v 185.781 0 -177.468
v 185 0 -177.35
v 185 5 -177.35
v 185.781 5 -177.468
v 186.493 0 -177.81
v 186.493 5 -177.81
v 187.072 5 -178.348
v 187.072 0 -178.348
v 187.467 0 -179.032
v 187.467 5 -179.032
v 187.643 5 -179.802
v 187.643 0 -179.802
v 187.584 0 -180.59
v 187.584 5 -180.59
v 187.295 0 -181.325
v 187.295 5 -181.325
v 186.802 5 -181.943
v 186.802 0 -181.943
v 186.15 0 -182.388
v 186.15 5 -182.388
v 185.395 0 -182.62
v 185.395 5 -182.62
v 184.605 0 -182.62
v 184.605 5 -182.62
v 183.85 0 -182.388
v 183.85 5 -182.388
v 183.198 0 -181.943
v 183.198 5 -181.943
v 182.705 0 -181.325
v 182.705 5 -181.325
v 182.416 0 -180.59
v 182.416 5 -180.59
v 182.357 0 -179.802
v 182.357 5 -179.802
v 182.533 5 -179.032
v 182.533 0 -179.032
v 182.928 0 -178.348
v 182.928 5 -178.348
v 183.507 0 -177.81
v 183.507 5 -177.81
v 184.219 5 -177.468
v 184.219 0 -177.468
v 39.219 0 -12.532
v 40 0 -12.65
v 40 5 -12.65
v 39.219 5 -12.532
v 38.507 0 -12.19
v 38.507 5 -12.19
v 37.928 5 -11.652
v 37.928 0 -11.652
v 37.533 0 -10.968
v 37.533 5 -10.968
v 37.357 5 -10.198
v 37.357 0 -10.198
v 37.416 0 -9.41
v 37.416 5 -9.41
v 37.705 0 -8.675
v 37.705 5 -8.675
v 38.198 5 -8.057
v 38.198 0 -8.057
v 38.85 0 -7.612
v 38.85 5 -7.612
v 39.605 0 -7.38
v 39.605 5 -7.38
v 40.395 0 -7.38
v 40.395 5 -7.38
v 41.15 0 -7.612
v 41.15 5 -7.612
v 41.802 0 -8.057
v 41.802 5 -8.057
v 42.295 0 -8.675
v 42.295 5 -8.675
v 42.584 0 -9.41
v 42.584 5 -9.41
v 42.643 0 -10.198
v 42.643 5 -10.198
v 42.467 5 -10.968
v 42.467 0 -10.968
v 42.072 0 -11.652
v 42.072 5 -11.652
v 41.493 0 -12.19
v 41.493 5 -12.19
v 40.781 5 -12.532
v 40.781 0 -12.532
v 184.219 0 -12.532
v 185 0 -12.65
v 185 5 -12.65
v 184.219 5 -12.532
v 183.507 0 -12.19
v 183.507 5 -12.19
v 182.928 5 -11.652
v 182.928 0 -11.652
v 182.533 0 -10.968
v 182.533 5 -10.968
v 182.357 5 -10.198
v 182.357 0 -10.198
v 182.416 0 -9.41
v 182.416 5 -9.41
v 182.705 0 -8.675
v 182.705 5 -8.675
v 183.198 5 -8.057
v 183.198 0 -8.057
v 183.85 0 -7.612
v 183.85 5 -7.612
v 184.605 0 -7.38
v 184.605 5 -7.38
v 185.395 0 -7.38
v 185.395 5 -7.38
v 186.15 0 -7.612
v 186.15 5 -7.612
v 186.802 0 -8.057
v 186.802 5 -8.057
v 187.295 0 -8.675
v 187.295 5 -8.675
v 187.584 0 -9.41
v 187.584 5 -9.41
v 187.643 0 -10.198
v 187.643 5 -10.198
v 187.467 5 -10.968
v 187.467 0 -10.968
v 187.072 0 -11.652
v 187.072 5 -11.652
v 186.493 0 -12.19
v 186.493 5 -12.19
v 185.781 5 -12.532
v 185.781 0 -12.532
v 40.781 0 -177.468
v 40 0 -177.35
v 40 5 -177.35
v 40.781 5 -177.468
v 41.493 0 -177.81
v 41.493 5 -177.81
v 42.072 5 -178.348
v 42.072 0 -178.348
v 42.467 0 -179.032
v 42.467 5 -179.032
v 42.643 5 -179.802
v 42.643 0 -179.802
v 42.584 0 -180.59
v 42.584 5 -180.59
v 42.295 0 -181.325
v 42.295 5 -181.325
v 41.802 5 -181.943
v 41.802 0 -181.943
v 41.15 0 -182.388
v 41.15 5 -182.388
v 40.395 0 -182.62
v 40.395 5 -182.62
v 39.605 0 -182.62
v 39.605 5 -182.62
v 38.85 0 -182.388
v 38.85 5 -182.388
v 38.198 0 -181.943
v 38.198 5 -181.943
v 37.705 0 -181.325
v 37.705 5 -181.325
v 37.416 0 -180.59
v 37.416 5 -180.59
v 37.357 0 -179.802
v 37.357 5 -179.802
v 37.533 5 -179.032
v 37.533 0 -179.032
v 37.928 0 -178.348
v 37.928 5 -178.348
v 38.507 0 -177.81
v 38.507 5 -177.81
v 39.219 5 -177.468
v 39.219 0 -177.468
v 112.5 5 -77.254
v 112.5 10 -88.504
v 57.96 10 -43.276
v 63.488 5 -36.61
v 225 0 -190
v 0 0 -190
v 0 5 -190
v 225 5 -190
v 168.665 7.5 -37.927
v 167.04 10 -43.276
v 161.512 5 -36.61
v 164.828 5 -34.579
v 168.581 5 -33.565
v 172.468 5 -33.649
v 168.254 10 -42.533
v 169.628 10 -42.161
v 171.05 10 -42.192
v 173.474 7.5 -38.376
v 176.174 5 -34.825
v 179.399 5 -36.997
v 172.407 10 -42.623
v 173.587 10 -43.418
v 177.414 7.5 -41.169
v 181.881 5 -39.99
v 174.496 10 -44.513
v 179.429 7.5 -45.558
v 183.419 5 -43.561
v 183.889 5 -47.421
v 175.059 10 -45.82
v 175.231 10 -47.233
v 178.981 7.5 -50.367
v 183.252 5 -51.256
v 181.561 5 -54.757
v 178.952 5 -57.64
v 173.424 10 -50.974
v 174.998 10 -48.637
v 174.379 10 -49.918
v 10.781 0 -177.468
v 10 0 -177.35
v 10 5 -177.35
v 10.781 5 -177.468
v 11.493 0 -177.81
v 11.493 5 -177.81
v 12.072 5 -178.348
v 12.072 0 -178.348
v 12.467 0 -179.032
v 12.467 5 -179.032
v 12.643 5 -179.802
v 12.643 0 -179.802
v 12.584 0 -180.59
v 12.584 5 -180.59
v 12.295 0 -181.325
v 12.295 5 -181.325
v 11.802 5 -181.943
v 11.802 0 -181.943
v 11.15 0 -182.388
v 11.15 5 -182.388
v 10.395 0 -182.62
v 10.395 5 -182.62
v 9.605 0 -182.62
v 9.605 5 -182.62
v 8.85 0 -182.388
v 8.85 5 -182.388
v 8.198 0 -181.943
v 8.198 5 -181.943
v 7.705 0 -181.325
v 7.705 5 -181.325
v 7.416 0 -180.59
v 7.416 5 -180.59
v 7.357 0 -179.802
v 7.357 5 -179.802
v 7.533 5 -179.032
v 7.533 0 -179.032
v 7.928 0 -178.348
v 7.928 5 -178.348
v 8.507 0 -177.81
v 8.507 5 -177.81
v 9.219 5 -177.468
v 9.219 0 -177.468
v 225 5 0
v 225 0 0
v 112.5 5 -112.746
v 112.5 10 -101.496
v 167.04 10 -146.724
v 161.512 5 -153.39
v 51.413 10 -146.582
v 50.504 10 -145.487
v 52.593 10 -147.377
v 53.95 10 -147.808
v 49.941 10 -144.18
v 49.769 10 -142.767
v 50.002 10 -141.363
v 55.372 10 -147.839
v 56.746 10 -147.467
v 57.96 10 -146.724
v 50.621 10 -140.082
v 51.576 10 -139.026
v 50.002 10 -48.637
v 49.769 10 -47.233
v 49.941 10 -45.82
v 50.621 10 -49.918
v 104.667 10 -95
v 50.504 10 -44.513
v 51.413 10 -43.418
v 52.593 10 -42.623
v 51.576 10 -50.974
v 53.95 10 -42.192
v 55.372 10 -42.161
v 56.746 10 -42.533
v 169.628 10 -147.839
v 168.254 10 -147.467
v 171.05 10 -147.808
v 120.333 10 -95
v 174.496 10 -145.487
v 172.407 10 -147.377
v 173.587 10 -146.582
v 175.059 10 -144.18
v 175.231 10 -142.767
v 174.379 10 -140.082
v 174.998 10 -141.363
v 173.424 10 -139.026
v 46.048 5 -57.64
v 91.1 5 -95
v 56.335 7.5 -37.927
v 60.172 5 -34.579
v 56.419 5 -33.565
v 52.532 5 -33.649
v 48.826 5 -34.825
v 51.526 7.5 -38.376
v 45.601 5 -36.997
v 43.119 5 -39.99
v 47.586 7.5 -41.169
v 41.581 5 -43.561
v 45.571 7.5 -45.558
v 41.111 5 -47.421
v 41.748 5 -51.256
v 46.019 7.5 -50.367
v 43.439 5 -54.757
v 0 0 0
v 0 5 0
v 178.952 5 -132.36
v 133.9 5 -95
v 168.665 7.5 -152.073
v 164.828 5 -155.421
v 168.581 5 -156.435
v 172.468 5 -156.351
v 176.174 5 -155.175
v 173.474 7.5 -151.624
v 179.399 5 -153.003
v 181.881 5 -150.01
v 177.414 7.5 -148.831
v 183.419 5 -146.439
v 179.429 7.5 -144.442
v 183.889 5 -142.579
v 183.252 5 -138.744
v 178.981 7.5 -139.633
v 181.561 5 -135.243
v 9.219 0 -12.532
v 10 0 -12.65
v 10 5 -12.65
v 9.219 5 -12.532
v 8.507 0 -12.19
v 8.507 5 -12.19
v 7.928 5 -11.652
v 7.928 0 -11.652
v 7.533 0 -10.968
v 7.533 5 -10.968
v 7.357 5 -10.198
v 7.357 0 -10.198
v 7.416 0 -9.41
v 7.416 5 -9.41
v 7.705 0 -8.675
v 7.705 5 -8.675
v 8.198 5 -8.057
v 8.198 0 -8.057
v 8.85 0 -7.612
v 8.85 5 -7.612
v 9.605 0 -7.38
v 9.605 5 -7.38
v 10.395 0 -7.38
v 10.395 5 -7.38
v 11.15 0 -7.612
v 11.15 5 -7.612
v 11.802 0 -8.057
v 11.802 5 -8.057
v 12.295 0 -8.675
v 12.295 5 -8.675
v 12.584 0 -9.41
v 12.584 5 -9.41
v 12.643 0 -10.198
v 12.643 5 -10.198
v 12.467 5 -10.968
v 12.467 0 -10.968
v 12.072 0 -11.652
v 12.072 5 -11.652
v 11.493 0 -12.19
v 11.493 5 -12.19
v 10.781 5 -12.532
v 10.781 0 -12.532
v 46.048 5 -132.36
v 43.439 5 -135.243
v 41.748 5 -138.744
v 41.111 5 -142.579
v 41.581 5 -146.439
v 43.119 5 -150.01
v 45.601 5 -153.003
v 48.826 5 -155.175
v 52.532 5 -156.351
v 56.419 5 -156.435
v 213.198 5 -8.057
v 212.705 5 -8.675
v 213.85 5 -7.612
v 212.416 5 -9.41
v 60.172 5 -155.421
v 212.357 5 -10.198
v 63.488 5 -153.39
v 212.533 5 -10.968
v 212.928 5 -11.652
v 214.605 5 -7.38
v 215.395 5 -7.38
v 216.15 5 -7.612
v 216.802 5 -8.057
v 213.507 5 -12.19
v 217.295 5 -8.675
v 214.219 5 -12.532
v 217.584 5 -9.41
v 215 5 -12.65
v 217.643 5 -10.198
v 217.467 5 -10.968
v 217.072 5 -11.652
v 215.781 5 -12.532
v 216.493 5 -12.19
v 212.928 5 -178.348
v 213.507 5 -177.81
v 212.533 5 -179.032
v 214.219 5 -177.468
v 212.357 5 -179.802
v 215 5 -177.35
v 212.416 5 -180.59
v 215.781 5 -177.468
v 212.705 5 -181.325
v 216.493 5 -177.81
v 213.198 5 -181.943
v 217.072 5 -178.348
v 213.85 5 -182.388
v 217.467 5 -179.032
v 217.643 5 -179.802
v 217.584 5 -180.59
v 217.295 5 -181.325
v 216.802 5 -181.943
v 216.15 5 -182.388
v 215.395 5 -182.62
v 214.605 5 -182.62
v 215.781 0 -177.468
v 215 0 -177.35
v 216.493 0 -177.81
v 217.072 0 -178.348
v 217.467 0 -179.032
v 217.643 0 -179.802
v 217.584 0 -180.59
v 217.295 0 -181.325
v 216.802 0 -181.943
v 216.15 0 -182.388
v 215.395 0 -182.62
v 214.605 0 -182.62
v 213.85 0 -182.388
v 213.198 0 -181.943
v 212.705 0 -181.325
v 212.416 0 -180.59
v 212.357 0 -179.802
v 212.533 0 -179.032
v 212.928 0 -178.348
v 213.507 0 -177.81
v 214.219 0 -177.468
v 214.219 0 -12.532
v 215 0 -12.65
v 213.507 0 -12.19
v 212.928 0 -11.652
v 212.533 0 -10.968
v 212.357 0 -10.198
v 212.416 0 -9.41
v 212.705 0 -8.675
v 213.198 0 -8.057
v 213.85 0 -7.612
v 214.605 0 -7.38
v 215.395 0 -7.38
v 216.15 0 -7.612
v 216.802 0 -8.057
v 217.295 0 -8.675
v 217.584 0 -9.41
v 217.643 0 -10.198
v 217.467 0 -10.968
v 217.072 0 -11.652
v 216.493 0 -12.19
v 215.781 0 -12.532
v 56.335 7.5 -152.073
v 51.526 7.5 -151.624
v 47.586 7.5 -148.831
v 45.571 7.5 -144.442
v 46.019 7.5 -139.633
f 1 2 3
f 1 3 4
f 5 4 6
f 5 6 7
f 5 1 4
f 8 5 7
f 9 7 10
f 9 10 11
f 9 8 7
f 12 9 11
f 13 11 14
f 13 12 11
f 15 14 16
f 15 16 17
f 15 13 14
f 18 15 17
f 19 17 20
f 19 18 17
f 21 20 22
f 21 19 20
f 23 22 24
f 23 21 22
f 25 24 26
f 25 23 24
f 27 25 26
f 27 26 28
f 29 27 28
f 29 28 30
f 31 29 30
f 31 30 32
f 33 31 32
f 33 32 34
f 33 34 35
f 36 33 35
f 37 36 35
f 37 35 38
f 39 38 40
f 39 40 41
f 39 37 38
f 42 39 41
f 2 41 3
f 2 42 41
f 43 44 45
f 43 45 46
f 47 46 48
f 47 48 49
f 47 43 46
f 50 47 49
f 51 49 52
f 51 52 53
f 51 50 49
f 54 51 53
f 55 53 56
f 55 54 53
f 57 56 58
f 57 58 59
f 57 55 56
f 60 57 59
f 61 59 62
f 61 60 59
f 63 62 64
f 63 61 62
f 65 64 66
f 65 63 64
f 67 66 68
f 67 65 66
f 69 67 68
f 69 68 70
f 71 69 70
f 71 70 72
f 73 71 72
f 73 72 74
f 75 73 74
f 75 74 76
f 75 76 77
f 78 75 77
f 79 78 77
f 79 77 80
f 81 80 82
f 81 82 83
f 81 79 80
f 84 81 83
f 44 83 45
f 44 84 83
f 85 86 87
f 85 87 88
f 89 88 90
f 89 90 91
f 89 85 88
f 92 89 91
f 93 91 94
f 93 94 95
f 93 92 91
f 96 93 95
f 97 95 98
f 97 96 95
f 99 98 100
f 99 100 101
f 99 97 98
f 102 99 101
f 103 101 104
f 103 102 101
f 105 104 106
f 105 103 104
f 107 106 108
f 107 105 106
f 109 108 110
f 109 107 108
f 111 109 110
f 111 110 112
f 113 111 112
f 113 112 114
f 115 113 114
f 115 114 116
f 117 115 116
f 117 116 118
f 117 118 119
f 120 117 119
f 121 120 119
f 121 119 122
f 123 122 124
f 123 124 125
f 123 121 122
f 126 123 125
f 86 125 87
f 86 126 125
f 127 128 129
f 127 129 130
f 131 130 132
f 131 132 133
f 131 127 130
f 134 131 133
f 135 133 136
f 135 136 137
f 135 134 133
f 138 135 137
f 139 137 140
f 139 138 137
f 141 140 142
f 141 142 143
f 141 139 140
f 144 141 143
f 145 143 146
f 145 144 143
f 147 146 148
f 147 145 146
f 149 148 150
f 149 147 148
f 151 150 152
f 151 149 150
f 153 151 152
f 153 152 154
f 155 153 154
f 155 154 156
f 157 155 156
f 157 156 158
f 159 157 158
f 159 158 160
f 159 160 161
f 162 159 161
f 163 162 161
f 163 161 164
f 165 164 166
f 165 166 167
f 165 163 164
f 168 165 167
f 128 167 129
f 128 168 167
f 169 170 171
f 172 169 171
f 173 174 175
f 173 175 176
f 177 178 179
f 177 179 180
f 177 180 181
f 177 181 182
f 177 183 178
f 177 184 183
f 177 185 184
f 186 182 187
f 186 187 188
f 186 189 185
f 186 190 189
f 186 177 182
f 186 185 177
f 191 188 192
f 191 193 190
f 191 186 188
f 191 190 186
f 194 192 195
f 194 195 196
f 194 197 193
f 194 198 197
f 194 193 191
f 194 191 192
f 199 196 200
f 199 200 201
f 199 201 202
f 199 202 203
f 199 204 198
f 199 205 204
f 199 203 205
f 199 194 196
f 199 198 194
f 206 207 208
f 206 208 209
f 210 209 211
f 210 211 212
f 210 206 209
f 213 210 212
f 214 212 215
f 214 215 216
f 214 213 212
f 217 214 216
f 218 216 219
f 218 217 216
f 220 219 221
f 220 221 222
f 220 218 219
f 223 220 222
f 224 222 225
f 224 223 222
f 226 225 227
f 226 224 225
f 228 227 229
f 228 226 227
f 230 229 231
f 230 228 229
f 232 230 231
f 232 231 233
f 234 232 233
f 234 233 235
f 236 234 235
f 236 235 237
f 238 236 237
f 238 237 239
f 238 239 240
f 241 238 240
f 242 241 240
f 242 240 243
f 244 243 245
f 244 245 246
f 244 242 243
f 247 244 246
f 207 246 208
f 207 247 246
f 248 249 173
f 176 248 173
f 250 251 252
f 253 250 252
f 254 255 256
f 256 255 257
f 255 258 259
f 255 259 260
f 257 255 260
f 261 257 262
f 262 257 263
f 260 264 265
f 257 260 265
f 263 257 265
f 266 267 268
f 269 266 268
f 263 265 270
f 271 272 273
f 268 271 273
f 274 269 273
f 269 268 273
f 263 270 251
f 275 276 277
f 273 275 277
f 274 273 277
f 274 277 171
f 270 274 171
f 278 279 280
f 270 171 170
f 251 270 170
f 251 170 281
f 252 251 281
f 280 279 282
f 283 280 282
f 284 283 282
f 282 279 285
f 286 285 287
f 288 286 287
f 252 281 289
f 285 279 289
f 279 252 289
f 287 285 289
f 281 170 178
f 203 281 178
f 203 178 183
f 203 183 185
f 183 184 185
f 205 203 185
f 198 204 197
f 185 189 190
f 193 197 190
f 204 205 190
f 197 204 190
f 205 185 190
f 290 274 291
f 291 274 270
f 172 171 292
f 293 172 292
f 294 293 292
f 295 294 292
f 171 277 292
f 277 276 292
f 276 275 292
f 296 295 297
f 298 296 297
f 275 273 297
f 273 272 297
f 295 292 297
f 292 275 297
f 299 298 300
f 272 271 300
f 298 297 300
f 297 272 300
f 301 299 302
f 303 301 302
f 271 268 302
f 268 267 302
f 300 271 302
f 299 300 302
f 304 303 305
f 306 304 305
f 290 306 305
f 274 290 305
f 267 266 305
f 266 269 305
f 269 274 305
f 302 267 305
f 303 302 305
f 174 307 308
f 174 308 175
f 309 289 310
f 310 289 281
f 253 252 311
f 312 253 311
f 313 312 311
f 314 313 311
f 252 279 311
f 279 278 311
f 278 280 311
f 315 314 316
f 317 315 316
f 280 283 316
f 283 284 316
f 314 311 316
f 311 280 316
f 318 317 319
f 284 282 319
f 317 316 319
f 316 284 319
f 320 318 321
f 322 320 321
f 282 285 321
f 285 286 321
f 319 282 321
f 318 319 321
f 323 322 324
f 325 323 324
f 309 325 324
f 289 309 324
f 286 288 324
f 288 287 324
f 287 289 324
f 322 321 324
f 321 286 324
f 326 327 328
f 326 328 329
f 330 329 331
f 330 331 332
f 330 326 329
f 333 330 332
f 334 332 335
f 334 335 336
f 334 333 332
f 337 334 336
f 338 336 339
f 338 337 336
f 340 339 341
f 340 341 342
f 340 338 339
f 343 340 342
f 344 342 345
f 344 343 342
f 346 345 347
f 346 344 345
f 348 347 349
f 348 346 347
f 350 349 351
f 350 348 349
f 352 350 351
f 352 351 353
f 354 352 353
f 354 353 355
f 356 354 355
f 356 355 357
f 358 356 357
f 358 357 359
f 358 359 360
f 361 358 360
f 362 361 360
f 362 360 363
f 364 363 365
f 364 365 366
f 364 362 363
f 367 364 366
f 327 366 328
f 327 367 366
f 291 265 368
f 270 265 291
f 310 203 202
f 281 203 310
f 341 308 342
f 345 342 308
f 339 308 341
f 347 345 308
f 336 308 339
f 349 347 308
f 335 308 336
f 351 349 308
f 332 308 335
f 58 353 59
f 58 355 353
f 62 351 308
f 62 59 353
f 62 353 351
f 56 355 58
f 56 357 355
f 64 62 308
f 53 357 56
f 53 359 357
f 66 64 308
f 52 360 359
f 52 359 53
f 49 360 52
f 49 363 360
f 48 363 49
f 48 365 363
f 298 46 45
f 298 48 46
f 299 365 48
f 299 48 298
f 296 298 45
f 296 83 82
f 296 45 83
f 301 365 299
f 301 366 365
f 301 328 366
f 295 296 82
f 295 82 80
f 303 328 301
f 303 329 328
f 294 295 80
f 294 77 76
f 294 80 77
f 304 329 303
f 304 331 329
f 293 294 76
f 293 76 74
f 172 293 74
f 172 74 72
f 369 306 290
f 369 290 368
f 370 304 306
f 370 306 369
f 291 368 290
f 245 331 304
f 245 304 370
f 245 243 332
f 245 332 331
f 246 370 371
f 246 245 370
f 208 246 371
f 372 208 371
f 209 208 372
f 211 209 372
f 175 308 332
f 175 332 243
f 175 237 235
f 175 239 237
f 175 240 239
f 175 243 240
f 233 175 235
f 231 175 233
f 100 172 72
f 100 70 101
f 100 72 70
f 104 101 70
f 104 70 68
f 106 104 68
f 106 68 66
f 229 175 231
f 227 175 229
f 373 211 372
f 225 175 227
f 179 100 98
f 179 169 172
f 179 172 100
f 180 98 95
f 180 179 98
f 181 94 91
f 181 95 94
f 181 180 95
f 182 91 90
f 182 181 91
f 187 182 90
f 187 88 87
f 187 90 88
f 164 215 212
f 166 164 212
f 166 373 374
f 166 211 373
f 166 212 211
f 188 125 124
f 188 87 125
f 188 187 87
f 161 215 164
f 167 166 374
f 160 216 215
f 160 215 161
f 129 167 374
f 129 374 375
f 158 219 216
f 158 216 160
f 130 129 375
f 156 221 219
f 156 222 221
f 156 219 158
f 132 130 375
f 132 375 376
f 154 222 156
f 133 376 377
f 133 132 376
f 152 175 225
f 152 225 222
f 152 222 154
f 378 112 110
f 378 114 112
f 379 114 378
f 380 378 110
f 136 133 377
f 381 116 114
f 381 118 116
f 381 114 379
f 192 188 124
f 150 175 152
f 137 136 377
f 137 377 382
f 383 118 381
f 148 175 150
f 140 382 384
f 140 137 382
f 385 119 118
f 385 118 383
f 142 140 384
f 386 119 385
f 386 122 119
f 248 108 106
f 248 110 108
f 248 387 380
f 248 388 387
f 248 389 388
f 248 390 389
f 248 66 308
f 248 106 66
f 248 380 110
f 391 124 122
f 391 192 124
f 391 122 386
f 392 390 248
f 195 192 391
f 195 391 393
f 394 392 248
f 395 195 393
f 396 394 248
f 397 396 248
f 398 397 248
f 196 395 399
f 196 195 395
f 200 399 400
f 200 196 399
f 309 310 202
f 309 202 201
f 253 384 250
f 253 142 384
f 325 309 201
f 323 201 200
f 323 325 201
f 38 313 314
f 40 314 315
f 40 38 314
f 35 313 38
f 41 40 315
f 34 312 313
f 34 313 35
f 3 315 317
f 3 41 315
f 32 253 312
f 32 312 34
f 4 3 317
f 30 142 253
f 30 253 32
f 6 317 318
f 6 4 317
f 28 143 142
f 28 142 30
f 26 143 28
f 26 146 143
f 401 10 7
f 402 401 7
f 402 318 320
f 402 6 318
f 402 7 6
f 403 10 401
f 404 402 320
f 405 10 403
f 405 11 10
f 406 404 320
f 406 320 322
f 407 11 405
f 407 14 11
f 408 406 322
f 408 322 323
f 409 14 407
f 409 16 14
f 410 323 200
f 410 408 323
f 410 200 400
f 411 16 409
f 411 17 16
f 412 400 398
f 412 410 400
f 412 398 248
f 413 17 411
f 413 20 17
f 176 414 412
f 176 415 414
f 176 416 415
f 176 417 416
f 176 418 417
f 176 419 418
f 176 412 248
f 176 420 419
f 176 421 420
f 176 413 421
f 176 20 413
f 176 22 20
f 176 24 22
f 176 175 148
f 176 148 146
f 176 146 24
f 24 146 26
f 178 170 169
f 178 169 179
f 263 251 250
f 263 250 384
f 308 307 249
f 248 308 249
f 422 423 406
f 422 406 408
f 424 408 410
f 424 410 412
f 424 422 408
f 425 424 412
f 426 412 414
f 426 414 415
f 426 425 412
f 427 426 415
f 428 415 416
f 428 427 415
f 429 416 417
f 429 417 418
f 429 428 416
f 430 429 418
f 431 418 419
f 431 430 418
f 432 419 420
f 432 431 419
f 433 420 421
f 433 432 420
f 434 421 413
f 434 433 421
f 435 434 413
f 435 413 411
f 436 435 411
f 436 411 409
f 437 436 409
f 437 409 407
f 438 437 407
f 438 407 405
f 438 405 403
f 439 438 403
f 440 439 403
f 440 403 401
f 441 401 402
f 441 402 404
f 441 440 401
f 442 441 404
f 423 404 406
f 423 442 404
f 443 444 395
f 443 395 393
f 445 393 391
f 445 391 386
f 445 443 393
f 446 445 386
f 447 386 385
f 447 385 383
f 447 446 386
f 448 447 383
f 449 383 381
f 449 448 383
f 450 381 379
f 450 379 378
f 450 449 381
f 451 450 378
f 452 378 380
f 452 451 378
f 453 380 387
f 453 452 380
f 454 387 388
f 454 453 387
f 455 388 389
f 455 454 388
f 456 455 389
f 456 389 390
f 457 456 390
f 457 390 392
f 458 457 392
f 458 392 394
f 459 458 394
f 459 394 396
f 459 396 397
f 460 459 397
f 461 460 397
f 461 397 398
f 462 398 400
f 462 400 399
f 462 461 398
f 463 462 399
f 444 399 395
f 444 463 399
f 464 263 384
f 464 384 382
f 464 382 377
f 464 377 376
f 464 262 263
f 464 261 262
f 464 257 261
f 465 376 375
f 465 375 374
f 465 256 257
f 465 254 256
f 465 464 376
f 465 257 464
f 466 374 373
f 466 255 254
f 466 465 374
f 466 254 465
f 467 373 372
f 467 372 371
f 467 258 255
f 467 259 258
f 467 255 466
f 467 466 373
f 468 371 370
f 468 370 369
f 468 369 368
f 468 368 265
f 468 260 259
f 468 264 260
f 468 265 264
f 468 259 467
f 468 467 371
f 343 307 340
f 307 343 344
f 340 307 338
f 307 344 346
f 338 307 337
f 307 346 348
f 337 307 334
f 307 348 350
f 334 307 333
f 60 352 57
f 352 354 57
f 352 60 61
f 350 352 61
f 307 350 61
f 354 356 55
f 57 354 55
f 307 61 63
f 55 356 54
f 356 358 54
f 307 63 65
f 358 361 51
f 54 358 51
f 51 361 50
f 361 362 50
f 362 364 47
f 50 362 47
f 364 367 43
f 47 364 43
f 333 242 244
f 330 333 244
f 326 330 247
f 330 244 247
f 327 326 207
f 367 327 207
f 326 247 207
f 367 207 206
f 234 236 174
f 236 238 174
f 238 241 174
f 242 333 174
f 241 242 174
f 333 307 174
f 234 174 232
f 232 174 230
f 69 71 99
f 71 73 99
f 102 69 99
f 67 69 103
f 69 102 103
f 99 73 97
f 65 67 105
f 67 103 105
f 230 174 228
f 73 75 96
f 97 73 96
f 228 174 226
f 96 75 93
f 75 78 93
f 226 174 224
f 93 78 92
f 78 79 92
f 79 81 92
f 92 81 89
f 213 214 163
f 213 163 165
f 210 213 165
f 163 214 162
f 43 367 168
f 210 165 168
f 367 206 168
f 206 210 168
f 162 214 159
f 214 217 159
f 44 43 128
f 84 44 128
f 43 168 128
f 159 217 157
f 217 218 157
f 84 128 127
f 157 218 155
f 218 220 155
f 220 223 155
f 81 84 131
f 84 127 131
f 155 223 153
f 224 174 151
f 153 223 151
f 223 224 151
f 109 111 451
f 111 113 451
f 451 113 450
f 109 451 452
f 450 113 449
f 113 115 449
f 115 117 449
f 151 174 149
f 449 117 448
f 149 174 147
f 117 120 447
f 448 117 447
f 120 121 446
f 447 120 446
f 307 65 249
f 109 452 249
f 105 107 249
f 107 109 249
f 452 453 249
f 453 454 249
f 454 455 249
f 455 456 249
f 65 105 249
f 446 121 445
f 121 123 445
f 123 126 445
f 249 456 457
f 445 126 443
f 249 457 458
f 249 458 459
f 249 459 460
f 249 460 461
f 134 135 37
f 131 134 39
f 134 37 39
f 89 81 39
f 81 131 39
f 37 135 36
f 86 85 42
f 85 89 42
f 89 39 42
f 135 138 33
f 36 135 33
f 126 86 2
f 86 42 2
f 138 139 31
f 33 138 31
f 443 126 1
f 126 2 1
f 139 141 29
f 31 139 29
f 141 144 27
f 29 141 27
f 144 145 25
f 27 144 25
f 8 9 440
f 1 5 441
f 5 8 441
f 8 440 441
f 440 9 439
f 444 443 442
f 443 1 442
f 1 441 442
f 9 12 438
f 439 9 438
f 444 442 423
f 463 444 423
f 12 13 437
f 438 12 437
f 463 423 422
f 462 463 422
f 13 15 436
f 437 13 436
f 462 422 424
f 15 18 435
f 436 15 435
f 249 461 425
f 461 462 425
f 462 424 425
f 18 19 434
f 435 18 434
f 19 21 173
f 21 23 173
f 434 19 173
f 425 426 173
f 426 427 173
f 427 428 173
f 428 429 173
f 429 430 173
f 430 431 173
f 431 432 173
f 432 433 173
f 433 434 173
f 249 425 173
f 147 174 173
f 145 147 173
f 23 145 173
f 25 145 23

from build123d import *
from OCP.BRepFilletAPI import BRepFilletAPI_MakeChamfer

# Parameters (mm, degrees)
SKETCH1_W           = 225
SKETCH1_H           = 190
SKETCH1_R           = 2.65
BOSS_EXTRUDE1_DEPTH = 5
BOSS_EXTRUDE2_DEPTH = 5
CHAMFER1_SIZE       = 8.660254038
CHAMFER1_SIZE_2     = 5


with BuildPart() as part:
    # Sketch1 → Boss-Extrude1 (new body)
    with BuildSketch(Plane(origin=(0, 0, 0), x_dir=(1, 0, 0), z_dir=(0, 1, 0))):
        with Locations((112.5, 95)):
            Rectangle(SKETCH1_W, SKETCH1_H)
        with Locations(Location((10, 180, 0), (0, 0, 270))):
            Circle(SKETCH1_R, mode=Mode.SUBTRACT)
        with Locations(Location((40, 180, 0), (0, 0, 270))):
            Circle(SKETCH1_R, mode=Mode.SUBTRACT)
        with Locations(Location((185, 180, 0), (0, 0, 270))):
            Circle(SKETCH1_R, mode=Mode.SUBTRACT)
        with Locations(Location((215, 180, 0), (0, 0, 270))):
            Circle(SKETCH1_R, mode=Mode.SUBTRACT)
        with Locations(Location((215, 10, 0), (0, 0, 90))):
            Circle(SKETCH1_R, mode=Mode.SUBTRACT)
        with Locations(Location((185, 10, 0), (0, 0, 90))):
            Circle(SKETCH1_R, mode=Mode.SUBTRACT)
        with Locations(Location((40, 10, 0), (0, 0, 90))):
            Circle(SKETCH1_R, mode=Mode.SUBTRACT)
        with Locations(Location((10, 10, 0), (0, 0, 90))):
            Circle(SKETCH1_R, mode=Mode.SUBTRACT)
    extrude(amount=BOSS_EXTRUDE1_DEPTH)

    # Sketch2 → Boss-Extrude2 (add)
    with BuildSketch(Plane(origin=(0, 5, 0), x_dir=(1, 0, 0), z_dir=(0, 1, 0))):
        with BuildLine():
            Line((51.576473623, 139.026400418), (167.040167682, 43.276019978))
            ThreePointArc((167.040167682, 43.276019978), (174.080636831, 43.933130432), (173.423526377, 50.973599582))
            Line((173.423526377, 50.973599582), (57.959832318, 146.723980022))
            ThreePointArc((57.959832318, 146.723980022), (50.919363169, 146.066869568), (51.576473623, 139.026400418))
        make_face()
    boss_extrude2 = extrude(amount=BOSS_EXTRUDE2_DEPTH)

    # Mirror1: Boss-Extrude2 across plane
    add(boss_extrude2.mirror(Plane(origin=(0, 0, -95), x_dir=(1, 0, 0), z_dir=(0, 0, -1))))

    # Chamfer1
    chamfer1_edges_1 = [part.edges().sort_by_distance(p)[0] for p in [
        (139.770083841, 5, -65.890235846),
    ]]
    chamfer1_side_1 = [part.faces().sort_by_distance(p)[0] for p in [
        (139.706250254, 5, -65.81326005),
    ]]
    chamfer1_edges_2 = [part.edges().sort_by_distance(p)[0] for p in [
        (174.080636831, 5, -43.933130432),
    ]]
    chamfer1_side_2 = [part.faces().sort_by_distance(p)[0] for p in [
        (174.157612628, 5, -43.869296845),
    ]]
    chamfer1_edges_3 = [part.edges().sort_by_distance(p)[0] for p in [
        (146.878196714, 5, -72.986799791),
    ]]
    chamfer1_side_3 = [part.faces().sort_by_distance(p)[0] for p in [
        (146.942030301, 5, -73.063775587),
    ]]
    chamfer1_edges_4 = [part.edges().sort_by_distance(p)[0] for p in [
        (146.878196714, 5, -117.013200209),
    ]]
    chamfer1_side_4 = [part.faces().sort_by_distance(p)[0] for p in [
        (146.942030301, 5, -116.936224413),
    ]]
    chamfer1_edges_5 = [part.edges().sort_by_distance(p)[0] for p in [
        (174.080636831, 5, -146.066869568),
    ]]
    chamfer1_side_5 = [part.faces().sort_by_distance(p)[0] for p in [
        (174.157612628, 5, -146.130703155),
    ]]
    chamfer1_edges_6 = [part.edges().sort_by_distance(p)[0] for p in [
        (139.770083841, 5, -124.109764154),
    ]]
    chamfer1_side_6 = [part.faces().sort_by_distance(p)[0] for p in [
        (139.706250254, 5, -124.18673995),
    ]]
    chamfer1_edges_7 = [part.edges().sort_by_distance(p)[0] for p in [
        (85.229916159, 5, -124.109764154),
    ]]
    chamfer1_side_7 = [part.faces().sort_by_distance(p)[0] for p in [
        (85.293749746, 5, -124.18673995),
    ]]
    chamfer1_edges_8 = [part.edges().sort_by_distance(p)[0] for p in [
        (85.229916159, 5, -65.890235846),
    ]]
    chamfer1_side_8 = [part.faces().sort_by_distance(p)[0] for p in [
        (85.293749746, 5, -65.81326005),
    ]]
    chamfer1_edges_9 = [part.edges().sort_by_distance(p)[0] for p in [
        (50.919363169, 5, -146.066869568),
    ]]
    chamfer1_side_9 = [part.faces().sort_by_distance(p)[0] for p in [
        (50.842387372, 5, -146.130703155),
    ]]
    chamfer1_edges_10 = [part.edges().sort_by_distance(p)[0] for p in [
        (50.919363169, 5, -43.933130432),
    ]]
    chamfer1_side_10 = [part.faces().sort_by_distance(p)[0] for p in [
        (50.842387372, 5, -43.869296845),
    ]]
    chamfer1_edges_11 = [part.edges().sort_by_distance(p)[0] for p in [
        (78.121803286, 5, -117.013200209),
    ]]
    chamfer1_side_11 = [part.faces().sort_by_distance(p)[0] for p in [
        (78.057969699, 5, -116.936224413),
    ]]
    chamfer1_edges_12 = [part.edges().sort_by_distance(p)[0] for p in [
        (78.121803286, 5, -72.986799791),
    ]]
    chamfer1_side_12 = [part.faces().sort_by_distance(p)[0] for p in [
        (78.057969699, 5, -73.063775587),
    ]]
    chamfer1 = BRepFilletAPI_MakeChamfer(part.part.solid().wrapped)
    for e in chamfer1_edges_1:
        chamfer1.Add(CHAMFER1_SIZE - 0.0001, CHAMFER1_SIZE_2 - 0.0001, e.wrapped, chamfer1_side_1[0].wrapped)
    for e in chamfer1_edges_2:
        chamfer1.Add(CHAMFER1_SIZE - 0.0001, CHAMFER1_SIZE_2 - 0.0001, e.wrapped, chamfer1_side_2[0].wrapped)
    for e in chamfer1_edges_3:
        chamfer1.Add(CHAMFER1_SIZE - 0.0001, CHAMFER1_SIZE_2 - 0.0001, e.wrapped, chamfer1_side_3[0].wrapped)
    for e in chamfer1_edges_4:
        chamfer1.Add(CHAMFER1_SIZE - 0.0001, CHAMFER1_SIZE_2 - 0.0001, e.wrapped, chamfer1_side_4[0].wrapped)
    for e in chamfer1_edges_5:
        chamfer1.Add(CHAMFER1_SIZE - 0.0001, CHAMFER1_SIZE_2 - 0.0001, e.wrapped, chamfer1_side_5[0].wrapped)
    for e in chamfer1_edges_6:
        chamfer1.Add(CHAMFER1_SIZE - 0.0001, CHAMFER1_SIZE_2 - 0.0001, e.wrapped, chamfer1_side_6[0].wrapped)
    for e in chamfer1_edges_7:
        chamfer1.Add(CHAMFER1_SIZE - 0.0001, CHAMFER1_SIZE_2 - 0.0001, e.wrapped, chamfer1_side_7[0].wrapped)
    for e in chamfer1_edges_8:
        chamfer1.Add(CHAMFER1_SIZE - 0.0001, CHAMFER1_SIZE_2 - 0.0001, e.wrapped, chamfer1_side_8[0].wrapped)
    for e in chamfer1_edges_9:
        chamfer1.Add(CHAMFER1_SIZE - 0.0001, CHAMFER1_SIZE_2 - 0.0001, e.wrapped, chamfer1_side_9[0].wrapped)
    for e in chamfer1_edges_10:
        chamfer1.Add(CHAMFER1_SIZE - 0.0001, CHAMFER1_SIZE_2 - 0.0001, e.wrapped, chamfer1_side_10[0].wrapped)
    for e in chamfer1_edges_11:
        chamfer1.Add(CHAMFER1_SIZE - 0.0001, CHAMFER1_SIZE_2 - 0.0001, e.wrapped, chamfer1_side_11[0].wrapped)
    for e in chamfer1_edges_12:
        chamfer1.Add(CHAMFER1_SIZE - 0.0001, CHAMFER1_SIZE_2 - 0.0001, e.wrapped, chamfer1_side_12[0].wrapped)
    add(Compound.cast(chamfer1.Shape()), mode=Mode.REPLACE)  # a hair under: the kernel refuses the full size


solid = part.part
